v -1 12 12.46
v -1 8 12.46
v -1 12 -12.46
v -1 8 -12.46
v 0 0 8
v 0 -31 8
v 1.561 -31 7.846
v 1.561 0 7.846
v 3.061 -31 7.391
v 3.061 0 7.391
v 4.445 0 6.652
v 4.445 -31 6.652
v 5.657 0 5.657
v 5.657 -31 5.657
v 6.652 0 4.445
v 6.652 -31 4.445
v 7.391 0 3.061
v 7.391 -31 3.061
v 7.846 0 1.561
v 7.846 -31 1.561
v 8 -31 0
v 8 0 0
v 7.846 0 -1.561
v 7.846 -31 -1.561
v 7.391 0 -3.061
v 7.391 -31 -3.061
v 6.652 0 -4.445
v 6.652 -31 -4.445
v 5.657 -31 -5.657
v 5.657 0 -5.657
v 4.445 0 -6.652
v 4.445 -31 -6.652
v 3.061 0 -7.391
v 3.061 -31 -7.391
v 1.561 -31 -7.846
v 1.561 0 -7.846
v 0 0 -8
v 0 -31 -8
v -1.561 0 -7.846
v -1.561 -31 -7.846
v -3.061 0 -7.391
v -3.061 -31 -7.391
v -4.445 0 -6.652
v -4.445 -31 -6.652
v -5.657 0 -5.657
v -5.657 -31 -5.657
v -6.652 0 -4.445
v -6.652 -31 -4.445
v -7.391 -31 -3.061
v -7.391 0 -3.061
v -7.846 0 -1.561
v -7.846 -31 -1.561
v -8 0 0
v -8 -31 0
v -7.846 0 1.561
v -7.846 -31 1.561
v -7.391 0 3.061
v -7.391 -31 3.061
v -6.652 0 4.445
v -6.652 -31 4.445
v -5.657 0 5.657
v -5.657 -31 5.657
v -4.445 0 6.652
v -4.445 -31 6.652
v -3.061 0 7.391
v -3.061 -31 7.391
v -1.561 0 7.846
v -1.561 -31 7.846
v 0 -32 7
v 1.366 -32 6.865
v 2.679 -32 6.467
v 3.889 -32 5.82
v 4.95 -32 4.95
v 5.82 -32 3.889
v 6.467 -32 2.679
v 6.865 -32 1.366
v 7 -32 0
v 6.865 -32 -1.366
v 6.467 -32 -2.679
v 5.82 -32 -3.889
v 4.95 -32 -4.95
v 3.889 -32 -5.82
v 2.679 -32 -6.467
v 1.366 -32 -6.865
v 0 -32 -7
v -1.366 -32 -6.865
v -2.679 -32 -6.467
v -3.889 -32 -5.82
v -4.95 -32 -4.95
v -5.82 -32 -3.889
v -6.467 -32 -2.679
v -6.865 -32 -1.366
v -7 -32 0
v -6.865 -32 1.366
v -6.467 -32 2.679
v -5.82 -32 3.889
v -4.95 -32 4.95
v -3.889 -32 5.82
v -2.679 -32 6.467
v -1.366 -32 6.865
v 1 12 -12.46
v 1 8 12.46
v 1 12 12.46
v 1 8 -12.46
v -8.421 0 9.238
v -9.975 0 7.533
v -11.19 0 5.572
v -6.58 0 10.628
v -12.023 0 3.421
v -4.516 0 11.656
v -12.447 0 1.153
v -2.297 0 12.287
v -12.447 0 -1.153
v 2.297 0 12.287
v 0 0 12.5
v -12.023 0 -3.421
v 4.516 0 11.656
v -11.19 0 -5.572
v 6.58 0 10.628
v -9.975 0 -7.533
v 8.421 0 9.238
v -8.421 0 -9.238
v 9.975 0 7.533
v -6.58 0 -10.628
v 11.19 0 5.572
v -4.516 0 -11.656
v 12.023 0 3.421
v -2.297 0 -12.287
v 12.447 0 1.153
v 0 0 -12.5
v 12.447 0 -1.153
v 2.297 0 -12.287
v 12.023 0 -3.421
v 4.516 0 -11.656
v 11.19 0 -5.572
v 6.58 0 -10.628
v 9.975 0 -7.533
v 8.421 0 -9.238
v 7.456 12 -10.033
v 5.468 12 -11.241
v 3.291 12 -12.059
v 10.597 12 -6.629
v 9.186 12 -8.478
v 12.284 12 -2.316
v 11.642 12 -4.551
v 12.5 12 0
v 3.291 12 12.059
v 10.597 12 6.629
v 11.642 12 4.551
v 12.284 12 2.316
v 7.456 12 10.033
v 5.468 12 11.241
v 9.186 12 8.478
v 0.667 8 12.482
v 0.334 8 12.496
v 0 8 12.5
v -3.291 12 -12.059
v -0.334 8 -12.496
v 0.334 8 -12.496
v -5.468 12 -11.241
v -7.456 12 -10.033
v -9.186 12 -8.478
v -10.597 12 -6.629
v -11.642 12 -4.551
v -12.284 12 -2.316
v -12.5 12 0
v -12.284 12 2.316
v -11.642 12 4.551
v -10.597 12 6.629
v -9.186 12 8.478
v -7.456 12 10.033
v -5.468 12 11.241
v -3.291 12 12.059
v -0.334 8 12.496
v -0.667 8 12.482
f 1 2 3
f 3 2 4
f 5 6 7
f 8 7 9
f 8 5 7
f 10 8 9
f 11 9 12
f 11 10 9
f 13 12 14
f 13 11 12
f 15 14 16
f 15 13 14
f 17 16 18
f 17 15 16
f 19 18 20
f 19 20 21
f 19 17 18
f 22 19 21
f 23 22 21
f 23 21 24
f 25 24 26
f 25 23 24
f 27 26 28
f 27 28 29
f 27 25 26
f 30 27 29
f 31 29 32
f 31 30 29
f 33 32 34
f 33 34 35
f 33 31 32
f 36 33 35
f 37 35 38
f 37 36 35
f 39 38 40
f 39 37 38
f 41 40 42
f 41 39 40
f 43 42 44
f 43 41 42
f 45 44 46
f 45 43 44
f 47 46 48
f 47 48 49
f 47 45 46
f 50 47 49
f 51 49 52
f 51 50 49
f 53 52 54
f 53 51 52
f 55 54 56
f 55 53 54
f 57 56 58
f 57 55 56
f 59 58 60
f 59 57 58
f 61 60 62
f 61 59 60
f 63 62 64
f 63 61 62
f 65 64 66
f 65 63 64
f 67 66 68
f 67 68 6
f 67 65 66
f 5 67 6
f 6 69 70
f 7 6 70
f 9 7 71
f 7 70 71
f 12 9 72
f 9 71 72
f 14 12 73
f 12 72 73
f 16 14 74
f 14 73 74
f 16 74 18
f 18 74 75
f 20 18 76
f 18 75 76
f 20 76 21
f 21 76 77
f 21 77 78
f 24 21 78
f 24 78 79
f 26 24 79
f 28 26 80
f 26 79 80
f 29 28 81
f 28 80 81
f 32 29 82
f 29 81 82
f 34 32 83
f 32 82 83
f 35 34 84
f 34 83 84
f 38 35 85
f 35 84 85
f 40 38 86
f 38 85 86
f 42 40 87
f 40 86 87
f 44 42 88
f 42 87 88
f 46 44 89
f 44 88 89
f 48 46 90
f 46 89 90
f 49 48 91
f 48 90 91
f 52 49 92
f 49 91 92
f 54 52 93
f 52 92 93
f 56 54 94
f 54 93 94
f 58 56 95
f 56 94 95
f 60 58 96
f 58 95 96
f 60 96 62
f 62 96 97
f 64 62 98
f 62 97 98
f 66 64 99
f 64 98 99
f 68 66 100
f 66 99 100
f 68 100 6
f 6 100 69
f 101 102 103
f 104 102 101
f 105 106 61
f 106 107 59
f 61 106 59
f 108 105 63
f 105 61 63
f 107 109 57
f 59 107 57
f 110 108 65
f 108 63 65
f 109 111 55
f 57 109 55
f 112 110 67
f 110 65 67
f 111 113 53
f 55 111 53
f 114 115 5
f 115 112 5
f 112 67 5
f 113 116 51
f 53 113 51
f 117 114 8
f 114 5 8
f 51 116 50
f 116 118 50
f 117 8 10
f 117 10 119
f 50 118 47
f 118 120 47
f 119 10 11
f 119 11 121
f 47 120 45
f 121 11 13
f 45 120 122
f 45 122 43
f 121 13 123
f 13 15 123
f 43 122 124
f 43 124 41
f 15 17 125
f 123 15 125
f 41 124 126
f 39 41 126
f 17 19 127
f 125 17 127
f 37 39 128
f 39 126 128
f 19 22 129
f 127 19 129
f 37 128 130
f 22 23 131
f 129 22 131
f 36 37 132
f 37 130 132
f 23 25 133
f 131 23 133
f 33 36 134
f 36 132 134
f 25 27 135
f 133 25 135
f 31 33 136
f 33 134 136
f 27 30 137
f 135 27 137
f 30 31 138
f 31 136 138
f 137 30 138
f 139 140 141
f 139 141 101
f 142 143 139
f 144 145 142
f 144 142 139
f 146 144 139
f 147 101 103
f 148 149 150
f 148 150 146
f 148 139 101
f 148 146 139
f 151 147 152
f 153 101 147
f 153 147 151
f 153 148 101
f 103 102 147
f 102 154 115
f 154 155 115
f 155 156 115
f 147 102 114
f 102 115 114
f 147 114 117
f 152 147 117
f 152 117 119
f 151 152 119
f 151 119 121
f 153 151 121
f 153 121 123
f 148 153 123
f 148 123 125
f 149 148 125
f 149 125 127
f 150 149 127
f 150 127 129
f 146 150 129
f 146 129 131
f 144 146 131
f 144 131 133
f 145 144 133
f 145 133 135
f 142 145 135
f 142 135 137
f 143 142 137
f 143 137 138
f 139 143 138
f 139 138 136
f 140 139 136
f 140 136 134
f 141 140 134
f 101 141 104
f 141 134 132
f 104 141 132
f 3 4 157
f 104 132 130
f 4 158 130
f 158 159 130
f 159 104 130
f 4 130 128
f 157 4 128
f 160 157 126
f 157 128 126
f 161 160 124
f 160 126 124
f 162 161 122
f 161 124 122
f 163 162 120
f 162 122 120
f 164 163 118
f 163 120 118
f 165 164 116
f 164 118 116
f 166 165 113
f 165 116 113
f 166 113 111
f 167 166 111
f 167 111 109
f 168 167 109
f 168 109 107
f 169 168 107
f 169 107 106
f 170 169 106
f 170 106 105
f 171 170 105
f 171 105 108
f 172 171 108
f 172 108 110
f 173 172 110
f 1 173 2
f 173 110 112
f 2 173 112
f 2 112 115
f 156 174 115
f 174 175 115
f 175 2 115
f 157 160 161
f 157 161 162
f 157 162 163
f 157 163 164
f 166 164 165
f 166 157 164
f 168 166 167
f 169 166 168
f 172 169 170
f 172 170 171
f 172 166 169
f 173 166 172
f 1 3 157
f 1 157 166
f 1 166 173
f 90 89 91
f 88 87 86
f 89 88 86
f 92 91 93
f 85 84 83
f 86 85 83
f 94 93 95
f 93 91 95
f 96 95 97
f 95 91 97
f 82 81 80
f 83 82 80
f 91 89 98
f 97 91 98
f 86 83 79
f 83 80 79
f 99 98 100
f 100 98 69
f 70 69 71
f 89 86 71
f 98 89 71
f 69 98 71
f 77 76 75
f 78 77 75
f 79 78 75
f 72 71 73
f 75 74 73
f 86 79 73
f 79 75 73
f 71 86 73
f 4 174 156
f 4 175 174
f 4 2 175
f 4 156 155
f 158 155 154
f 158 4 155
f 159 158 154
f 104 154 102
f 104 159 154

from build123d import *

# Parameters (mm, degrees)
IZIM3_R                     = 12.5
Y_KSEKLIK_EKSTR_ZYON1_DEPTH = 12
IZIM3_3_R                   = 8
Y_KSEKLIK_EKSTR_ZYON2_DEPTH = 32
PAH1_SIZE                   = 1
KES_EKSTR_ZYON1_DEPTH       = 48.418350878
KES_EKSTR_ZYON1_DEPTH_BACK  = 4
IZIM4_W                     = 2
IZIM4_H                     = 25


with BuildPart() as part:
    # Çizim3 → Yükseklik-Ekstrüzyon1 (new body)
    with BuildSketch(Plane(origin=(0, 0, 0), x_dir=(1, 0, 0), z_dir=(0, 1, 0))):
        Circle(IZIM3_R)
    extrude(amount=Y_KSEKLIK_EKSTR_ZYON1_DEPTH)

    # Çizim3<3> → Yükseklik-Ekstrüzyon2 (add)
    with BuildSketch(Plane(origin=(0, 0, 0), x_dir=(1, 0, 0), z_dir=(0, 1, 0))):
        Circle(IZIM3_3_R)
    extrude(amount=-Y_KSEKLIK_EKSTR_ZYON2_DEPTH)

    # Pah1
    pah1_edges = [part.edges().sort_by_distance(p)[0] for p in [
        (-8, -32, 0),
    ]]
    chamfer(pah1_edges, length=PAH1_SIZE)

    # Çizim4 → Kes-Ekstrüzyon1 (cut, two sides: drawn at the far end of the back side and taken through both)
    with BuildSketch(Plane(origin=(0, 12, 0), x_dir=(1, 0, 0), z_dir=(0, 1, 0)).offset(-KES_EKSTR_ZYON1_DEPTH_BACK)):
        Rectangle(IZIM4_W, IZIM4_H)
    extrude(amount=KES_EKSTR_ZYON1_DEPTH + KES_EKSTR_ZYON1_DEPTH_BACK, mode=Mode.SUBTRACT)


solid = part.part
